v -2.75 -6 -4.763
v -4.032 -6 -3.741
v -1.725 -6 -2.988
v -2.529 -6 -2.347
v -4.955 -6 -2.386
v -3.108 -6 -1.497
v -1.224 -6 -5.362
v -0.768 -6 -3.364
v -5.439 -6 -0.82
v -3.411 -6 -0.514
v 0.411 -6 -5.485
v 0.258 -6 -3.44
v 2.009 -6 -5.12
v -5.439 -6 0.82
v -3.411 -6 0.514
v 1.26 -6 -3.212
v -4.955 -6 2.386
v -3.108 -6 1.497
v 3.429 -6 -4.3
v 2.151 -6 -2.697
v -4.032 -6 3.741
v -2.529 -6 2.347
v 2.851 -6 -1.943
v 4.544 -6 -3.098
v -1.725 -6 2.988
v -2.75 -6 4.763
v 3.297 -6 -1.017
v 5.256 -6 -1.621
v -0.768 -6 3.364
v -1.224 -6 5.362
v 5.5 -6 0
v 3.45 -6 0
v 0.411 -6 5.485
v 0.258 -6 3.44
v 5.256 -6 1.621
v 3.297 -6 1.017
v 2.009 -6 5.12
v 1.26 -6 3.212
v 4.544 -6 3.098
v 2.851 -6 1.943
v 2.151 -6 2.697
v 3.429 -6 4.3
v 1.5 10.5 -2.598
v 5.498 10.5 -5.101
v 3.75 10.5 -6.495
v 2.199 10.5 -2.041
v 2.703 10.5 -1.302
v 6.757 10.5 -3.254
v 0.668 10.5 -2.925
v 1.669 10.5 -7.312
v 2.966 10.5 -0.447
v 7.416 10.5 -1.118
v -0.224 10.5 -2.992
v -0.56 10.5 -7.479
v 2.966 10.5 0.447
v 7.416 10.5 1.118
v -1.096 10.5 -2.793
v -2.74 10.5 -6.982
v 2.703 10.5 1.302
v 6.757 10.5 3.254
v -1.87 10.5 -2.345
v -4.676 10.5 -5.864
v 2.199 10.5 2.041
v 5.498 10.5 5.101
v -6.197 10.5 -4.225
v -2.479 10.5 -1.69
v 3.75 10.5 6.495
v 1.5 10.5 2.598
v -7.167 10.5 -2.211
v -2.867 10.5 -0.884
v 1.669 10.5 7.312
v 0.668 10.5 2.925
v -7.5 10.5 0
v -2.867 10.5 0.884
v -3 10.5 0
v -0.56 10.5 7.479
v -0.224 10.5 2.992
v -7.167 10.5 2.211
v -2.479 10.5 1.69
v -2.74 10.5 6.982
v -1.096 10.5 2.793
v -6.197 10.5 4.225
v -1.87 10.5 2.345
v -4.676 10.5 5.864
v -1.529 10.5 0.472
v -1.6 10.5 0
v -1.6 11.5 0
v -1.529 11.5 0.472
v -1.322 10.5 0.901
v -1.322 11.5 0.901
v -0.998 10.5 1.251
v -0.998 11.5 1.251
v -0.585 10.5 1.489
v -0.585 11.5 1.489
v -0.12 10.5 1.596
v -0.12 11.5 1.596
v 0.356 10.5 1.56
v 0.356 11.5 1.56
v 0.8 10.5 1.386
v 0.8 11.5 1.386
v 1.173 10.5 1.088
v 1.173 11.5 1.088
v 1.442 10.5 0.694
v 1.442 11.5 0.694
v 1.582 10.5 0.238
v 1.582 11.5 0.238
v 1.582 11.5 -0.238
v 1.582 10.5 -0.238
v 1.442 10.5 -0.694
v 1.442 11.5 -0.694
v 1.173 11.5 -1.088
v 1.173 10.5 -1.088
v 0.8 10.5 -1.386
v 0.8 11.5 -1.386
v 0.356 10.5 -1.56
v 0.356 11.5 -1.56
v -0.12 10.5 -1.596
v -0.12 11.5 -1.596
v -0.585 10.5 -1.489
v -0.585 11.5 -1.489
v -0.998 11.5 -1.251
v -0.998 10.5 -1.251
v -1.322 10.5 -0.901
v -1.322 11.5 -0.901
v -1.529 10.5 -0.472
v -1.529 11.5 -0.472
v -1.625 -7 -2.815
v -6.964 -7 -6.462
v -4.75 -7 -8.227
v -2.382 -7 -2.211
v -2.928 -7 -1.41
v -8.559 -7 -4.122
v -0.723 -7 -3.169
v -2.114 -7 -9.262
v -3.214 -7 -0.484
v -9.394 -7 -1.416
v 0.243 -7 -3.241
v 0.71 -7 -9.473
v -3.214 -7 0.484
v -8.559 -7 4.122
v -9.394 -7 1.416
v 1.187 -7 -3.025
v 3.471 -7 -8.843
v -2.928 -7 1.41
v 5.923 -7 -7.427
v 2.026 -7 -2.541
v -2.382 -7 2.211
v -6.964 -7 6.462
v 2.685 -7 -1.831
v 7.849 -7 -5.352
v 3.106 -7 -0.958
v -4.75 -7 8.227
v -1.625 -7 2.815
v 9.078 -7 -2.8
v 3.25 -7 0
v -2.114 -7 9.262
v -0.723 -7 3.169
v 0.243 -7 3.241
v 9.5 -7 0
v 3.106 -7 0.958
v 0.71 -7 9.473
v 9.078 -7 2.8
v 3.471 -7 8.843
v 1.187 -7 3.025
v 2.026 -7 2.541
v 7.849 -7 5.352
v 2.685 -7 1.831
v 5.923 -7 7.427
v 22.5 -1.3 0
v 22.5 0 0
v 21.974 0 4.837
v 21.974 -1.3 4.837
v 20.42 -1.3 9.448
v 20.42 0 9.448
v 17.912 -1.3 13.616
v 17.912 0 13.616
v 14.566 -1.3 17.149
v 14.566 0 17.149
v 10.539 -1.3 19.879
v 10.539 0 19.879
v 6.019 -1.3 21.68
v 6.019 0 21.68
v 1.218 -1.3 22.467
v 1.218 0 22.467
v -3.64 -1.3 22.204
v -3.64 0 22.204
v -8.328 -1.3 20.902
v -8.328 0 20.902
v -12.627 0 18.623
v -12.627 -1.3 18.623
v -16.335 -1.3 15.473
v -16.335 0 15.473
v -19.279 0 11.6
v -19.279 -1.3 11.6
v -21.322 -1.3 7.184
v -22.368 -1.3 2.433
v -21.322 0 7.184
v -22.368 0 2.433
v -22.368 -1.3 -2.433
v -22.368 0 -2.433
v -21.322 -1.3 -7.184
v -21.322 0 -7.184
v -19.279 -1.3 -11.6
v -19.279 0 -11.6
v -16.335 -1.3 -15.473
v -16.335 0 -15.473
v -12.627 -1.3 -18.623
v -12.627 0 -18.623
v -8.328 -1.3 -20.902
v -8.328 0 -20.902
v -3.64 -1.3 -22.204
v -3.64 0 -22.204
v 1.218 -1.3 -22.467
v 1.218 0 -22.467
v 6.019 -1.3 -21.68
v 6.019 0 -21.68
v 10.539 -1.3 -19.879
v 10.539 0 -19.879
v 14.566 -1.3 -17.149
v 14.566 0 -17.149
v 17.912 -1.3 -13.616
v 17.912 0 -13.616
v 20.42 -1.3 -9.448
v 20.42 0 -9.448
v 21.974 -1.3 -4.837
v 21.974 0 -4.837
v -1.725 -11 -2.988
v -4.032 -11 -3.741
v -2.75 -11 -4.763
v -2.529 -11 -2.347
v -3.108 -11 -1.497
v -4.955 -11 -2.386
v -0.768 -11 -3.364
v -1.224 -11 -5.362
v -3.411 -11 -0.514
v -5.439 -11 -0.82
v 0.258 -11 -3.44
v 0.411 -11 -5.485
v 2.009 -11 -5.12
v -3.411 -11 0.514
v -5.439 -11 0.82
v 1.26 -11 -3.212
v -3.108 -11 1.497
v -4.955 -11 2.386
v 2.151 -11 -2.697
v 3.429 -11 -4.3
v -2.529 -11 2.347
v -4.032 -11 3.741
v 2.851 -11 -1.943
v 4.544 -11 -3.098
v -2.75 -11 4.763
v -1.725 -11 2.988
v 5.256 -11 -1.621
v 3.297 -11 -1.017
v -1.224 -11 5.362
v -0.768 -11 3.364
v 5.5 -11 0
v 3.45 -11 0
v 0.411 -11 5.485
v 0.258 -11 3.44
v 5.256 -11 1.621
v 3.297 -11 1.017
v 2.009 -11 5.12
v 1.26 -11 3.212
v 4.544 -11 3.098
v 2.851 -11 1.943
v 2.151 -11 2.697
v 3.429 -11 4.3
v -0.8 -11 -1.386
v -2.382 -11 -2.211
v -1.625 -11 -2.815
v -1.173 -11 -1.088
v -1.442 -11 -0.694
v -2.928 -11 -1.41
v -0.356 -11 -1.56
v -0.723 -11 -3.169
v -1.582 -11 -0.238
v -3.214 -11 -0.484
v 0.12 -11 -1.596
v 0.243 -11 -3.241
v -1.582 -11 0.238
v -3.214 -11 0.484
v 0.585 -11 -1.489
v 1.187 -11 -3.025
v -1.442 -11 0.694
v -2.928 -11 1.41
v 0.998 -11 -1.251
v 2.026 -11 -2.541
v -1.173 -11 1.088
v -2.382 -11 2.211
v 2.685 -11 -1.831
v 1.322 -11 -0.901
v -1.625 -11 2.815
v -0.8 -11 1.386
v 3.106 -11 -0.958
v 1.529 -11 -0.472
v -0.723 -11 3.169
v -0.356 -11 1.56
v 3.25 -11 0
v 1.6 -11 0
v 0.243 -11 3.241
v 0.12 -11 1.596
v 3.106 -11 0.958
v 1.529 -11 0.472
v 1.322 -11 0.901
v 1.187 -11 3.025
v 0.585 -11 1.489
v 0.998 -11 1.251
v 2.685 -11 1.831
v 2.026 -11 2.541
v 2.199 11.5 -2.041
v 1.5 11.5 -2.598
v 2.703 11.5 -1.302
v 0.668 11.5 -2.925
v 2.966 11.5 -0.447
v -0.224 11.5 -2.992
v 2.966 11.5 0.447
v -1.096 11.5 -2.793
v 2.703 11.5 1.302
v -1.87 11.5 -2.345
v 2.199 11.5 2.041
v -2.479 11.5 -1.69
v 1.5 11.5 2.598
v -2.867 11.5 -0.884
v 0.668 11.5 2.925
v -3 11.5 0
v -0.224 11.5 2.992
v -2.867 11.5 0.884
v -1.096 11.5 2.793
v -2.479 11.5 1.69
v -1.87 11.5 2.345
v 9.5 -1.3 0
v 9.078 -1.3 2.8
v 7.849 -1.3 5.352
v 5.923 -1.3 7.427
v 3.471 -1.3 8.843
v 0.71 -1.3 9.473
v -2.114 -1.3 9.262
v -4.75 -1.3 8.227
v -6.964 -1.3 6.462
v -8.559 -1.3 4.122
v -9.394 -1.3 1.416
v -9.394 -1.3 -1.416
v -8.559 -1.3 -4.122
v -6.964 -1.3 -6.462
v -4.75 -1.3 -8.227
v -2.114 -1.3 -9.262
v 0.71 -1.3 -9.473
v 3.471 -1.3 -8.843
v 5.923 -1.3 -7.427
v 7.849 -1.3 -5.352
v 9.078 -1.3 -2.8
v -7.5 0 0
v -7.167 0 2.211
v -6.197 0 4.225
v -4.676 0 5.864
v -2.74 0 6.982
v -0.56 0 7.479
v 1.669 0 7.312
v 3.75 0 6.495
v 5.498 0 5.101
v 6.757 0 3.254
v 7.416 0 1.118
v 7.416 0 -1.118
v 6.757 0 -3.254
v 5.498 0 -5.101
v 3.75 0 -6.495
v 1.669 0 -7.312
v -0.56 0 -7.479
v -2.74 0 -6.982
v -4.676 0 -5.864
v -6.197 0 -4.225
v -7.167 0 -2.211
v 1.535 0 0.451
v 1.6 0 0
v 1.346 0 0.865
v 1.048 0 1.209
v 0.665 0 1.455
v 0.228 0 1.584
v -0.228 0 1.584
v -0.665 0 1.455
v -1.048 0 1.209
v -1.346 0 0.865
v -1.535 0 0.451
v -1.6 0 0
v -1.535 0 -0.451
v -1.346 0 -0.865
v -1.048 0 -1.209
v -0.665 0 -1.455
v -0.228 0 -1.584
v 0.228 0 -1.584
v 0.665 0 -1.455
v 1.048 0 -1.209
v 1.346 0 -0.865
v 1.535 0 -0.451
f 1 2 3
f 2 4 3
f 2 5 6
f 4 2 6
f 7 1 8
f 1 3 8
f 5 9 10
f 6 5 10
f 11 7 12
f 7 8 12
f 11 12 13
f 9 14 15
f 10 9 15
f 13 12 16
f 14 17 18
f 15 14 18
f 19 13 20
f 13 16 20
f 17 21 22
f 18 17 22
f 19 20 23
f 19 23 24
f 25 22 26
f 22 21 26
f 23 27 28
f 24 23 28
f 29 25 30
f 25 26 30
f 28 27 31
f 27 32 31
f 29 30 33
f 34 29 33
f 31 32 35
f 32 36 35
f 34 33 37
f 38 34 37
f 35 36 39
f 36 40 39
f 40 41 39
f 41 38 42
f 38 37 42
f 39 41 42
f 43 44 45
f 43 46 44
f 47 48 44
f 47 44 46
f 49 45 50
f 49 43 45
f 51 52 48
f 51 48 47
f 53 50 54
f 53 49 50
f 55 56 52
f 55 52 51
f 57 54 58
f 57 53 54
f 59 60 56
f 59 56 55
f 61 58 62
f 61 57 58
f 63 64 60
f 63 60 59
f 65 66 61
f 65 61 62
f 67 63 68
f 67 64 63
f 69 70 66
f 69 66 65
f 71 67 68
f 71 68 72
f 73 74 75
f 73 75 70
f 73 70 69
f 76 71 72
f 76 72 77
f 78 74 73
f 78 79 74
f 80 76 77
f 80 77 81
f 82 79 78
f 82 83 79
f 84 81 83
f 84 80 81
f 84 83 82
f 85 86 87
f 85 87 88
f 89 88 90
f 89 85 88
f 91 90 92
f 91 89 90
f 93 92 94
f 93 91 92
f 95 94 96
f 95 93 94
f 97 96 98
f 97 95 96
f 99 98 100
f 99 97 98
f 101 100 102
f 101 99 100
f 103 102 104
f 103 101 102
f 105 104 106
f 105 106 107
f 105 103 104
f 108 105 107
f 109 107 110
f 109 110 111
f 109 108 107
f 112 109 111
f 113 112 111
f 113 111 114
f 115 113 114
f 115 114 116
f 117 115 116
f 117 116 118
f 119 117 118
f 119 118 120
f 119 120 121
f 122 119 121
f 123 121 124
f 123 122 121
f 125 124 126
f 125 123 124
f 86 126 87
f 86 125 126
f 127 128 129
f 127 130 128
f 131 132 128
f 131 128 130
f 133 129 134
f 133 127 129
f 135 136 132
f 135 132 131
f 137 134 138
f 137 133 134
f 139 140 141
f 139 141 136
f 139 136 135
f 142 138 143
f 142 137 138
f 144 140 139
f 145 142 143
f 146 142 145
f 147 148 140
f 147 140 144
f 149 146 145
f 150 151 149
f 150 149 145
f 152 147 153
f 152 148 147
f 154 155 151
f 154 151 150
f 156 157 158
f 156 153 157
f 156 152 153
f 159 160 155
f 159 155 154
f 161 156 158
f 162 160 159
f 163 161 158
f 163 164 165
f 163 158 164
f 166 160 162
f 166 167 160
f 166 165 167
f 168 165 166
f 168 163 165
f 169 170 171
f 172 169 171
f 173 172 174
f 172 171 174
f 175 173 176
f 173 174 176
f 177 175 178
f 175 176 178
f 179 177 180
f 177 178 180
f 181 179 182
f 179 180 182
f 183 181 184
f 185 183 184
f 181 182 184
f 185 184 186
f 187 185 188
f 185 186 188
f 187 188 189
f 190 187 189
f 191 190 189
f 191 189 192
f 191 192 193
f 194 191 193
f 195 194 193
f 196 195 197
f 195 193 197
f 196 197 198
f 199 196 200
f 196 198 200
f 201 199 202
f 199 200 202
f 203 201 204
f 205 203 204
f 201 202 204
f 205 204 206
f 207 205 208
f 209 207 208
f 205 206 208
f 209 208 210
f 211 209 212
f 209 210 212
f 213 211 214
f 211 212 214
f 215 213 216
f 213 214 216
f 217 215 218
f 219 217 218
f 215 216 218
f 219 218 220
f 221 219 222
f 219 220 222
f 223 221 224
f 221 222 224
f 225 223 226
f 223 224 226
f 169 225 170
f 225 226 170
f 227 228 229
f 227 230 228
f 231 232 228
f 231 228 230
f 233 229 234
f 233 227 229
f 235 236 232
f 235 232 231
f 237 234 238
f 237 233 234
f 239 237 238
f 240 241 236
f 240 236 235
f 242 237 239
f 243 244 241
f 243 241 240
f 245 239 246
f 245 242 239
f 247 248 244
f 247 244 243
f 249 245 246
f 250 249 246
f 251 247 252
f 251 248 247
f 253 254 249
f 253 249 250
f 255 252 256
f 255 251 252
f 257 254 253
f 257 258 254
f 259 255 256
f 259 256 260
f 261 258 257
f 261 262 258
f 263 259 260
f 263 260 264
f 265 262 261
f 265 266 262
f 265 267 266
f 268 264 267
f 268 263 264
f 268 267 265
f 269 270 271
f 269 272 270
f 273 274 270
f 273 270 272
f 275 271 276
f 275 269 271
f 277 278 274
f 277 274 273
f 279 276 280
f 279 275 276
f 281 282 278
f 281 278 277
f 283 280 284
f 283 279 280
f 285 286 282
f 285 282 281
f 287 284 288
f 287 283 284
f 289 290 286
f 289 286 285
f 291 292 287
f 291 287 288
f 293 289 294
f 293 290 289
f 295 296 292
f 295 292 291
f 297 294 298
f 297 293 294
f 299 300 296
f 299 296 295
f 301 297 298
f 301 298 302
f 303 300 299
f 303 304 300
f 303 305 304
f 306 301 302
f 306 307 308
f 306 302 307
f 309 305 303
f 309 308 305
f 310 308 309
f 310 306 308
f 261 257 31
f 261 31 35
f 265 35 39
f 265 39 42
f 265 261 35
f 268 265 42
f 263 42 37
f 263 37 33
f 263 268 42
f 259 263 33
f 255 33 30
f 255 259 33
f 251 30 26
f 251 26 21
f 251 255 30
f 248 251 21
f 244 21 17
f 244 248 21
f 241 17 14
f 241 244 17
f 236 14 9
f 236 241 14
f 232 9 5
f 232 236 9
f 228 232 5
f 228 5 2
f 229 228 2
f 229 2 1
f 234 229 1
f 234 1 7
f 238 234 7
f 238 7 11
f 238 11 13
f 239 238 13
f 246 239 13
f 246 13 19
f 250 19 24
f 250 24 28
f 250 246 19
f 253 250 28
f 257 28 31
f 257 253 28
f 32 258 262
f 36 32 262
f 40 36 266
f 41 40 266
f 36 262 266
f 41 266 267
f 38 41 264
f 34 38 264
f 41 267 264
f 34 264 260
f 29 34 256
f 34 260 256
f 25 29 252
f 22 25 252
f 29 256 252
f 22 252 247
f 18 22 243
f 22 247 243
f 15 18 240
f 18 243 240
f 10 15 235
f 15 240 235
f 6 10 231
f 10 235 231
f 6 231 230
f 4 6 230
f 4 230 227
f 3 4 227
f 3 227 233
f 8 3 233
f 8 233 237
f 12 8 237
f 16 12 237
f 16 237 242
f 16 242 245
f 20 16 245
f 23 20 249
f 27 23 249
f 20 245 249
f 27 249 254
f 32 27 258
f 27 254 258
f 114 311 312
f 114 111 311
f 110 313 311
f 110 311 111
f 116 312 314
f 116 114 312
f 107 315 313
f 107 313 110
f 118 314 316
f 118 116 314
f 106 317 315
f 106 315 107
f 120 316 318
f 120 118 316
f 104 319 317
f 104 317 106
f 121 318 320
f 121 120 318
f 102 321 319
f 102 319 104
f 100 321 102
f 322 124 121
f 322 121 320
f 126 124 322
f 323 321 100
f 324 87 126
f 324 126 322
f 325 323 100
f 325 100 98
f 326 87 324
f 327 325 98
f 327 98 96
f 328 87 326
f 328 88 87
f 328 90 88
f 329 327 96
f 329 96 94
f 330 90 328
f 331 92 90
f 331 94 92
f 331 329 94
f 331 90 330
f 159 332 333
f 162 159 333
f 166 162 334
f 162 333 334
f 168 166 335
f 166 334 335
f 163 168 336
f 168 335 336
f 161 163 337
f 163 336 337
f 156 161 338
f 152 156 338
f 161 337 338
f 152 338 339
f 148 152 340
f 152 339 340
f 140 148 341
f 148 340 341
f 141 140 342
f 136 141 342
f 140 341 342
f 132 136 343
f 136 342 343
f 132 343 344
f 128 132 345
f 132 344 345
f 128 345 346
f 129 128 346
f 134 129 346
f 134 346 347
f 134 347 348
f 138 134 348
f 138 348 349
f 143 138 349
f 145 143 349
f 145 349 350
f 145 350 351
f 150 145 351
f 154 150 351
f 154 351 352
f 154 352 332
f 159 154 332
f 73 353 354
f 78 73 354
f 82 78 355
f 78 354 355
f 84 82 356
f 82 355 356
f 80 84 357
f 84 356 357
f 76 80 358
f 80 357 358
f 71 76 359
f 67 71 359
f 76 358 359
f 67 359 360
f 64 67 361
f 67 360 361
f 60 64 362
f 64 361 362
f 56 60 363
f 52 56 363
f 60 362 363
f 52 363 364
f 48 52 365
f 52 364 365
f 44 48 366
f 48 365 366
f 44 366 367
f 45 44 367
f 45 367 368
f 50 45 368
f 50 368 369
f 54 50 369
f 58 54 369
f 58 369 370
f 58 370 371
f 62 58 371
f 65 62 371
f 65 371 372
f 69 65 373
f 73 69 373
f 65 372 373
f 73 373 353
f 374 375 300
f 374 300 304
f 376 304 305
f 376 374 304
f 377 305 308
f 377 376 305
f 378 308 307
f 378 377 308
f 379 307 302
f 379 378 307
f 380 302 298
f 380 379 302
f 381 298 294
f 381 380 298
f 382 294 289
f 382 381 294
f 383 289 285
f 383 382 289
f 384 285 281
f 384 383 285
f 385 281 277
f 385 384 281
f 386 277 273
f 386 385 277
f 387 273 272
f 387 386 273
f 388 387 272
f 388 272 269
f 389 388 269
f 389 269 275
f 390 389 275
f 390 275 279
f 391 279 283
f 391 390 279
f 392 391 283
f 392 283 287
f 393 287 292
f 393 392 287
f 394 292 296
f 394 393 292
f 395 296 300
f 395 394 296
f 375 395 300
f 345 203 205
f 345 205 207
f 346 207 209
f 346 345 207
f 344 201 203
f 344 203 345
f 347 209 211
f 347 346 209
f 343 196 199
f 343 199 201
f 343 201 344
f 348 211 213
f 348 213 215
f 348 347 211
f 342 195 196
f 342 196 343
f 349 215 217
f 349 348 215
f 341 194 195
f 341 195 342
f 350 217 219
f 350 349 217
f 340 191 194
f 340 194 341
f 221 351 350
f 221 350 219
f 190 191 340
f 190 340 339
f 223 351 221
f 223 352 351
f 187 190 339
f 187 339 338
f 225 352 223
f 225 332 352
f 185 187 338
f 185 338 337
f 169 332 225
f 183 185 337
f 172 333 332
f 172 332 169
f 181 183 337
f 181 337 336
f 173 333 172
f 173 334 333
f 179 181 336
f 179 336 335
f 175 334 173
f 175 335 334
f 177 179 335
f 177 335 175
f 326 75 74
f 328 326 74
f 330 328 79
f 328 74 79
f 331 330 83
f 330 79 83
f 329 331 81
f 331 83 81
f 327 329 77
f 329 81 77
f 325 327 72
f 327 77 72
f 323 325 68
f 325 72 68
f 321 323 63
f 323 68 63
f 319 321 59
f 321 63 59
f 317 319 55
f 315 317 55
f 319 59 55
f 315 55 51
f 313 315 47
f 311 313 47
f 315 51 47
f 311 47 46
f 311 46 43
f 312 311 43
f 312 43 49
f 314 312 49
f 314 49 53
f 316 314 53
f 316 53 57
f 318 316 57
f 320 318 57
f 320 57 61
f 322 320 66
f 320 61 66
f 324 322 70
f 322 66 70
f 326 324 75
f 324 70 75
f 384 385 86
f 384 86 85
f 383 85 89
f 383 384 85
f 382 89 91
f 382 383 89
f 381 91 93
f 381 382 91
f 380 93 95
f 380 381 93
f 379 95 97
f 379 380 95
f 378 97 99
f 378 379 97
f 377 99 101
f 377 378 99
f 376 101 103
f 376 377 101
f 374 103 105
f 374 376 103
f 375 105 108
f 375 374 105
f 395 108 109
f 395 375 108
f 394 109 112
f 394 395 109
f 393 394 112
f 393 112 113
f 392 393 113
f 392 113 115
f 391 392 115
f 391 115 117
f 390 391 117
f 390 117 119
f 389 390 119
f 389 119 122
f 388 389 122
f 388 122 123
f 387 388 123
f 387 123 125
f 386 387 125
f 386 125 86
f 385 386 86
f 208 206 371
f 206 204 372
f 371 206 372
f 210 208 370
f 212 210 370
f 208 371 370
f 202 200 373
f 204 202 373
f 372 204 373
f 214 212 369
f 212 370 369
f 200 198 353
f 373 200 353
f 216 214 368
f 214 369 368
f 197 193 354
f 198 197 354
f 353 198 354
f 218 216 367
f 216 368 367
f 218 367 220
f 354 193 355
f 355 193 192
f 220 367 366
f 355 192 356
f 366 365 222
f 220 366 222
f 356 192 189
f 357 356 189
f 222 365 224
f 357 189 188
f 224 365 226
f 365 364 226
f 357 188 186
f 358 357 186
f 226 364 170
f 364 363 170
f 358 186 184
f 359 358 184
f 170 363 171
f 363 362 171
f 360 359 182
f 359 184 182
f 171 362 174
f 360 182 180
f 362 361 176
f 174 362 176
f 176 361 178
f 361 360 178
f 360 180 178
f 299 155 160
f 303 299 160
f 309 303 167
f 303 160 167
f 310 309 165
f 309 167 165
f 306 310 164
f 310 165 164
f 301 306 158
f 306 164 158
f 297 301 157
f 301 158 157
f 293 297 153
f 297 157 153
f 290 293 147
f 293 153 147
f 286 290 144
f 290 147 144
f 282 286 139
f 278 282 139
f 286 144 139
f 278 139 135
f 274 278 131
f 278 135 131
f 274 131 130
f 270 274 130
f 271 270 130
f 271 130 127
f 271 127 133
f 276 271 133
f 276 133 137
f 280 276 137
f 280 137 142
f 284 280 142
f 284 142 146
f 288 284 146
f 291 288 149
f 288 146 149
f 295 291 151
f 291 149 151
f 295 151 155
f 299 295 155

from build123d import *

# Parameters (mm, degrees)
F0_R      = 22.5
F0_R_2    = 9.5
F0_R_3    = 1.6
F1_DEPTH  = 1.3
F2_DEPTH  = 7
F3_R      = 3.25
F3_R_2    = 1.6
F4_DEPTH  = 4
F5_R      = 7.5
F5_R_2    = 1.6
F6_DEPTH  = 10.5
F7_R      = 3
F7_R_2    = 1.6
F8_DEPTH  = 1
F9_R      = 5.5
F9_R_2    = 3.45
F10_DEPTH = 5


with BuildPart() as f1:
    # F0 (on Front) → F1 (new body)
    with BuildSketch(Plane.XZ):
        Circle(F0_R)
        Circle(F0_R_2, mode=Mode.SUBTRACT)
        Circle(F0_R_2)
        Circle(F0_R_3, mode=Mode.SUBTRACT)
    extrude(amount=F1_DEPTH)

    # F0 (on Front) → F2 (join)
    with BuildSketch(Plane.XZ):
        Circle(F0_R_2)
        Circle(F0_R_3, mode=Mode.SUBTRACT)
    extrude(amount=F2_DEPTH)

    # F3 (on face) → F4 (join)
    with BuildSketch(Plane.XZ.offset(7)):
        Circle(F3_R)
        Circle(F3_R_2, mode=Mode.SUBTRACT)
    extrude(amount=F4_DEPTH)

    # F5 (on face) → F6 (join)
    with BuildSketch(Plane(origin=(0, 0, 0), x_dir=(-1, 0, 0), z_dir=(0, 1, 0))):
        Circle(F5_R)
        Circle(F5_R_2, mode=Mode.SUBTRACT)
    extrude(amount=F6_DEPTH)

    # F7 (on face) → F8 (join)
    with BuildSketch(Plane(origin=(0, 10.5, 0), x_dir=(-1, 0, 0), z_dir=(0, 1, 0))):
        Circle(F7_R)
        Circle(F7_R_2, mode=Mode.SUBTRACT)
    extrude(amount=F8_DEPTH)


with BuildPart() as f10:
    # F9 (on face) → F10 (new body)
    with BuildSketch(Plane.XZ.offset(11)):
        Circle(F9_R)
        Circle(F9_R_2, mode=Mode.SUBTRACT)
    extrude(amount=-F10_DEPTH)


solid = Compound([f1.part, f10.part])
